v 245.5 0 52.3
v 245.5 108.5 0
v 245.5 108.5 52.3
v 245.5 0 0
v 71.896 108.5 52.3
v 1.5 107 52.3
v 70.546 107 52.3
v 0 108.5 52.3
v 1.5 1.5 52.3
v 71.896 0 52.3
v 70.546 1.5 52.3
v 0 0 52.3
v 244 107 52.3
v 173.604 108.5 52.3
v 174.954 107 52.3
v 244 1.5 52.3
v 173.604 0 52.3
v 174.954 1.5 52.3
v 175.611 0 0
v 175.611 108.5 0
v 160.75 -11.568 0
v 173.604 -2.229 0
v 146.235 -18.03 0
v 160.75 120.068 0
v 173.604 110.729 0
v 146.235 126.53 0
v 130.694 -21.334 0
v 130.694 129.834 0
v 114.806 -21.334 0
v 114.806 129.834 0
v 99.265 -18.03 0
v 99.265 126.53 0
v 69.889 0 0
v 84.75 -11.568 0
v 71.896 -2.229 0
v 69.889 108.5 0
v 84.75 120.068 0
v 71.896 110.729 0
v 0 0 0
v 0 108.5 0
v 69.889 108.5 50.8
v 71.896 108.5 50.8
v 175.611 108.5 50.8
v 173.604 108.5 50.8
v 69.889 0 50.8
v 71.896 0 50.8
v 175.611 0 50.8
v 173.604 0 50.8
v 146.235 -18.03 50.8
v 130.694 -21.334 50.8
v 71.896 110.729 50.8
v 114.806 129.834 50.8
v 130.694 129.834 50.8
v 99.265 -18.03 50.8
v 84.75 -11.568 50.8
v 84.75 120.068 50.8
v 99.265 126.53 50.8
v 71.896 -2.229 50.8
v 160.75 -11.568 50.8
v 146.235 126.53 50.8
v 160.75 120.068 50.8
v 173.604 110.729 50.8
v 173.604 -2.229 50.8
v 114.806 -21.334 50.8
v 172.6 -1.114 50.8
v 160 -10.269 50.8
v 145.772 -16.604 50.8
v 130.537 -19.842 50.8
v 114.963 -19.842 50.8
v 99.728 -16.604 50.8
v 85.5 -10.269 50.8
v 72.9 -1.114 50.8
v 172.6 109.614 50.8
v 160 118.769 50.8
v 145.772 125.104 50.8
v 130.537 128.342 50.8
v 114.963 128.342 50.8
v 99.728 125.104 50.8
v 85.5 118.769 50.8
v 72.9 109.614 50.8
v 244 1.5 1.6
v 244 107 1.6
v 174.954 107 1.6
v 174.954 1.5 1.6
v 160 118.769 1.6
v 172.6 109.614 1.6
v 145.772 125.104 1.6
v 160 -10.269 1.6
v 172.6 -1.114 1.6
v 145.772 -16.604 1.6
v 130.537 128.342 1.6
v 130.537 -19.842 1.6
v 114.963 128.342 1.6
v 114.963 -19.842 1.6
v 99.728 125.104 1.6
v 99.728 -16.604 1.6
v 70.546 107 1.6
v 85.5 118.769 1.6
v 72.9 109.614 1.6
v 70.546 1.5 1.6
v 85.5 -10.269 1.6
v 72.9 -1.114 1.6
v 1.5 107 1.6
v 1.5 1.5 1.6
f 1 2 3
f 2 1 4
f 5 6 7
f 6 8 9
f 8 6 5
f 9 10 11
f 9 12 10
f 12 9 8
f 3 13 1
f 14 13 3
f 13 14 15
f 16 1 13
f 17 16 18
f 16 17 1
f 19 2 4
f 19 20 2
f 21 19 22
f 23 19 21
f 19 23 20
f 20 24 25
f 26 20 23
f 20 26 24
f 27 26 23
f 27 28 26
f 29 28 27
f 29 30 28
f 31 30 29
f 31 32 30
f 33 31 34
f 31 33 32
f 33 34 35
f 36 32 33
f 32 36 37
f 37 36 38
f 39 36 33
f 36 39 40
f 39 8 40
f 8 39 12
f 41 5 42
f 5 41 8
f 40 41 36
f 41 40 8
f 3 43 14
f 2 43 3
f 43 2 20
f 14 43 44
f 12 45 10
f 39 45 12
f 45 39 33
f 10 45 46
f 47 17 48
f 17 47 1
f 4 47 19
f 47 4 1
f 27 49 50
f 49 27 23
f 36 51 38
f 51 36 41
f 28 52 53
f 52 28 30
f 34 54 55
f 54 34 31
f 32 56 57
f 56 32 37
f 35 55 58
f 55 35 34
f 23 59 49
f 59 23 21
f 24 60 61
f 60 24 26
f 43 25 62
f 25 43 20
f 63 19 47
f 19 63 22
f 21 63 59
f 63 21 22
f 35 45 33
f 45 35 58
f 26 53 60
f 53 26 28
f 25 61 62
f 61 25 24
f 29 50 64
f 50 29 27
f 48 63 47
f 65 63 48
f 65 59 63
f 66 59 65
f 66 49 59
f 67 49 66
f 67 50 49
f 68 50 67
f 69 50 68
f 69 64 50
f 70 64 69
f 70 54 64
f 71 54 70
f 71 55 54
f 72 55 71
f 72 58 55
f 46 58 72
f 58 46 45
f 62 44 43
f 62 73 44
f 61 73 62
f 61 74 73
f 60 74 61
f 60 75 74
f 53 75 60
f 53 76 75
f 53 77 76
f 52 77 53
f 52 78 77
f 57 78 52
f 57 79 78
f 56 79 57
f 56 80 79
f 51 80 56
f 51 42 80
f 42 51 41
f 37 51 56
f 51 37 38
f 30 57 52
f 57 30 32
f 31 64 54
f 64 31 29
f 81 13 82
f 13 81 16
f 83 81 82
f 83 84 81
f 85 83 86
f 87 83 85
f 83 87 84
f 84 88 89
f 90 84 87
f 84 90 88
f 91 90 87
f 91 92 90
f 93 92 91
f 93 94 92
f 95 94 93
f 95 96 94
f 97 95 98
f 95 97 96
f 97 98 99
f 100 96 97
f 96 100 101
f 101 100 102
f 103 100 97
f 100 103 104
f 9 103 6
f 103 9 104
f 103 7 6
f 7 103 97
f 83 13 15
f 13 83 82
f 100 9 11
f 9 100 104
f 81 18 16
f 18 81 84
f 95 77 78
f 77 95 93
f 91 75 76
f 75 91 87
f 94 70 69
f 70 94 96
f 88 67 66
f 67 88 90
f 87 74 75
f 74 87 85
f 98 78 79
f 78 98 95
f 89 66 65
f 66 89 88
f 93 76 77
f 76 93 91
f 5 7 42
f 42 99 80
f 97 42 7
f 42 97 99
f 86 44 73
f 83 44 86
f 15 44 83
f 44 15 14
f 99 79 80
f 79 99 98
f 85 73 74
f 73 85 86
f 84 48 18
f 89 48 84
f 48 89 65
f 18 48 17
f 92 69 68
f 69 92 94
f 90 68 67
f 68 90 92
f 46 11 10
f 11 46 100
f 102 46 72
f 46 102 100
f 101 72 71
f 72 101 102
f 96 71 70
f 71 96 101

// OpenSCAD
padding=2.5;
inner_width=103 + padding;
inner_length=240 + padding;
inner_radius=144/2  + padding;
height=25.4*2;
wall_thickness=1.5;



difference(){
   union(){
        cube([inner_length+(2*wall_thickness)
                , inner_width+(2*wall_thickness)
                , height+wall_thickness]);
        translate([wall_thickness+ inner_length/2,wall_thickness + inner_width/2,0])
        cylinder(r1=inner_radius+wall_thickness, r2=inner_radius+wall_thickness, h=height);
    }
    translate([wall_thickness,wall_thickness,wall_thickness+.1])
    union(){
        cube([inner_length, inner_width,height]);
        translate([inner_length/2,inner_width/2,0])
        cylinder(r1=inner_radius, r2=inner_radius, h=height);
    }
}
